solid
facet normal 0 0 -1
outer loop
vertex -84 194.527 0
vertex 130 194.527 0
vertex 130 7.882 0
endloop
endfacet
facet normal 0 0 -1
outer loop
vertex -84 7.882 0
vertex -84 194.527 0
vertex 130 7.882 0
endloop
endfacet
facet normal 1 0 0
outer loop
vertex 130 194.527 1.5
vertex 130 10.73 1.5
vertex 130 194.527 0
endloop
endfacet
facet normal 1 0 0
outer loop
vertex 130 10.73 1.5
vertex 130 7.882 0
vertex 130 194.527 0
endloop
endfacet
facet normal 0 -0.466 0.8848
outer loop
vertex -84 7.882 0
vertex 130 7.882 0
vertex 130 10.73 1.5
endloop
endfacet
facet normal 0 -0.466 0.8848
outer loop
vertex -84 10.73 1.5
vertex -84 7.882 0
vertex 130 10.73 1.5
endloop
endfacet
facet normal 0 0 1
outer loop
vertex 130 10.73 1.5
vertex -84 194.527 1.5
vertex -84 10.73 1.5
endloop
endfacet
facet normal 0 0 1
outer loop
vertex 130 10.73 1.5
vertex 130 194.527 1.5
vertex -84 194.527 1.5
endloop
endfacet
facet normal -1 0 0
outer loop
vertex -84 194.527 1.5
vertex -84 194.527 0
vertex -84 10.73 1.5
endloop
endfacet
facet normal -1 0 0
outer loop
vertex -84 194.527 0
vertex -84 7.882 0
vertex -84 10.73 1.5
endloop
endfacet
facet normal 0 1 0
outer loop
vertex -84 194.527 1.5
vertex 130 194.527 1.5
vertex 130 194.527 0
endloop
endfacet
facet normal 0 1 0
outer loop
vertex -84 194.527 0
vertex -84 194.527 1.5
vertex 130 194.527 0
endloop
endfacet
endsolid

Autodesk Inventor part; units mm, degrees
ref_plane "YZ Plane" through (0, 0, 0) normal (1, 0, 0) x (0, 1, 0)
ref_plane "XZ Plane" through (0, 0, 0) normal (0, 1, 0) x (-1, 0, 0)
ref_plane "XY Plane" through (0, 0, 0) normal (0, 0, 1) x (1, 0, 0)
sketch "Эскиз1" plane through (0, 0, 0) normal (0, 0, 1) x (1, 0, 0)
  line L0 (0, 0) -> (130, 0)
  line L1 (130, 0) -> (130, 240)
  line L2 (130, 240) -> (0, 240)
  line L3 (0, 240) -> (0, 0)
  dimension "d0" = 130
  dimension "d1" = 240
extrude "Выдавливание1" add sketch "Эскиз1" along normal blind 1.5
ref_plane "РабПлоскость1" through (130, 7.8819, 0) normal (1, 0, 0) x (0, 0, -1)
sketch "Эскиз3" plane through (130, 7.8819, 0) normal (1, 0, 0) x (0, 0, -1)
  line L0 (-1.5, 2.8482) -> (0, 0) projected
  line L1 (0, 0) -> (-1.5, 2.8482)
  line L2 (0, -7.8819) -> (0, 232.1181) projected
  line L3 (0, 232.1181) -> (-1.5, 232.1181) projected
  line L4 (-1.5, -7.8819) -> (-1.5, 232.1181) projected
  line L5 (0, -7.8819) -> (-1.5, -7.8819) projected
  point P0 (0, -7.8819)
  point P1 (0, 0)
  point P2 (-1.5, 2.8482)
extrude "Выдавливание3" cut sketch "Эскиз3" against normal through all contours L0 L2 L5 L4
sketch "Эскиз4" plane through (0, 0, 0) normal (0, 0, -1) x (-1, 0, 0)
  line L0 (-186.9271, 194.527) -> (57.0729, 194.527) projected
  line L1 (-130, 7.8819) -> (0, 7.8819) projected
  line L2 (0, 240) -> (0, 7.8819) projected
  line L3 (-130, 240) -> (0, 240) projected
  line L4 (-130, 7.8819) -> (-130, 240) projected
  point P0 (0, 0)
  point P1 (-130, 194.527)
  point P2 (0, 194.527)
extrude "Выдавливание4" cut sketch "Эскиз4" against normal blind 10 contours L4 L3 L2 L0
sketch "Эскиз5" plane through (0, 7.8819, 0) normal (-1, 0, 0) x (0, 0, 1)
  line L0 (1.5, 186.6451) -> (0, 186.6451) projected
  line L1 (0, 186.6451) -> (0, 0) projected
  line L2 (0, 0) -> (1.5, 2.8482) projected
  line L3 (1.5, 186.6451) -> (1.5, 2.8482) projected
  point P0 (0, -7.8819)
extrude "Выдавливание5" add sketch "Эскиз5" along normal blind 84
sketch "Эскиз6" plane through (130, 7.8819, 0) normal (1, 0, 0) x (0, 0, -1)
  line L0 (0, 186.6451) -> (0, 0) projected
  line L1 (0, 0) -> (-1.5, 2.8482) projected
  line L2 (-1.5, 2.8482) -> (-1.5, 186.6451) projected
  line L3 (-1.5, 186.6451) -> (0, 186.6451) projected
  line L4 (8.5, 202.2968) -> (8.5, 0)
  circle A0 centre (515.0502, 101.1484) radius 516.5502
  circle A1 centre (515.0502, 101.1484) radius 514.5502
  point P0 (0, -7.8819)
  point P1 (8.5, 10.767)
  point P2 (8.5, 191.5298)
  point P3 (0, 140.4854)
  point P4 (0, 61.8114)
  dimension "d14" = 10
  dimension "d15" = 2
sketch "Эскиз7" plane through (-84, 7.8819, 0) normal (-1, 0, 0) x (0, 0, 1)
  point P0 (0, -7.8819)
sketch "Эскиз8" plane through (130, 10.73, 1.5) normal (1, 0, 0) x (0, 0, -1)
  line L0 (74.6894, 55.2388) -> (-105.8733, 389.5996) projected
  line L1 (1.0792, 191.548) -> (24.6268, 147.9433)
  line L2 (24.6268, 147.9433) -> (43.5247, 158.1486)
  line L3 (43.5247, 158.1486) -> (19.9771, 201.7533)
  line L4 (19.9771, 201.7533) -> (1.0792, 191.548)
  point P0 (1.5, -10.73)
extrude "Выдавливание7" cut sketch "Эскиз8" against normal through all
sketch "Эскиз9" plane through (-84, 7.8819, 0) normal (-1, 0, 0) x (0, 0, 1)
  line L0 (0, 186.6451) -> (0, 0) projected
  line L1 (0, 0) -> (1.5, 2.8482) projected
  line L2 (1.5, 2.8482) -> (1.5, 186.6451) projected
  arc A0 (-8.5, 0) -> (0, 140.4854) centre (-515.0502, 101.1484) ccw
  line L3 (1.5, 186.6451) -> (0, 186.6451) projected
  point P0 (0, -7.8819)
properties part number "наклон"
